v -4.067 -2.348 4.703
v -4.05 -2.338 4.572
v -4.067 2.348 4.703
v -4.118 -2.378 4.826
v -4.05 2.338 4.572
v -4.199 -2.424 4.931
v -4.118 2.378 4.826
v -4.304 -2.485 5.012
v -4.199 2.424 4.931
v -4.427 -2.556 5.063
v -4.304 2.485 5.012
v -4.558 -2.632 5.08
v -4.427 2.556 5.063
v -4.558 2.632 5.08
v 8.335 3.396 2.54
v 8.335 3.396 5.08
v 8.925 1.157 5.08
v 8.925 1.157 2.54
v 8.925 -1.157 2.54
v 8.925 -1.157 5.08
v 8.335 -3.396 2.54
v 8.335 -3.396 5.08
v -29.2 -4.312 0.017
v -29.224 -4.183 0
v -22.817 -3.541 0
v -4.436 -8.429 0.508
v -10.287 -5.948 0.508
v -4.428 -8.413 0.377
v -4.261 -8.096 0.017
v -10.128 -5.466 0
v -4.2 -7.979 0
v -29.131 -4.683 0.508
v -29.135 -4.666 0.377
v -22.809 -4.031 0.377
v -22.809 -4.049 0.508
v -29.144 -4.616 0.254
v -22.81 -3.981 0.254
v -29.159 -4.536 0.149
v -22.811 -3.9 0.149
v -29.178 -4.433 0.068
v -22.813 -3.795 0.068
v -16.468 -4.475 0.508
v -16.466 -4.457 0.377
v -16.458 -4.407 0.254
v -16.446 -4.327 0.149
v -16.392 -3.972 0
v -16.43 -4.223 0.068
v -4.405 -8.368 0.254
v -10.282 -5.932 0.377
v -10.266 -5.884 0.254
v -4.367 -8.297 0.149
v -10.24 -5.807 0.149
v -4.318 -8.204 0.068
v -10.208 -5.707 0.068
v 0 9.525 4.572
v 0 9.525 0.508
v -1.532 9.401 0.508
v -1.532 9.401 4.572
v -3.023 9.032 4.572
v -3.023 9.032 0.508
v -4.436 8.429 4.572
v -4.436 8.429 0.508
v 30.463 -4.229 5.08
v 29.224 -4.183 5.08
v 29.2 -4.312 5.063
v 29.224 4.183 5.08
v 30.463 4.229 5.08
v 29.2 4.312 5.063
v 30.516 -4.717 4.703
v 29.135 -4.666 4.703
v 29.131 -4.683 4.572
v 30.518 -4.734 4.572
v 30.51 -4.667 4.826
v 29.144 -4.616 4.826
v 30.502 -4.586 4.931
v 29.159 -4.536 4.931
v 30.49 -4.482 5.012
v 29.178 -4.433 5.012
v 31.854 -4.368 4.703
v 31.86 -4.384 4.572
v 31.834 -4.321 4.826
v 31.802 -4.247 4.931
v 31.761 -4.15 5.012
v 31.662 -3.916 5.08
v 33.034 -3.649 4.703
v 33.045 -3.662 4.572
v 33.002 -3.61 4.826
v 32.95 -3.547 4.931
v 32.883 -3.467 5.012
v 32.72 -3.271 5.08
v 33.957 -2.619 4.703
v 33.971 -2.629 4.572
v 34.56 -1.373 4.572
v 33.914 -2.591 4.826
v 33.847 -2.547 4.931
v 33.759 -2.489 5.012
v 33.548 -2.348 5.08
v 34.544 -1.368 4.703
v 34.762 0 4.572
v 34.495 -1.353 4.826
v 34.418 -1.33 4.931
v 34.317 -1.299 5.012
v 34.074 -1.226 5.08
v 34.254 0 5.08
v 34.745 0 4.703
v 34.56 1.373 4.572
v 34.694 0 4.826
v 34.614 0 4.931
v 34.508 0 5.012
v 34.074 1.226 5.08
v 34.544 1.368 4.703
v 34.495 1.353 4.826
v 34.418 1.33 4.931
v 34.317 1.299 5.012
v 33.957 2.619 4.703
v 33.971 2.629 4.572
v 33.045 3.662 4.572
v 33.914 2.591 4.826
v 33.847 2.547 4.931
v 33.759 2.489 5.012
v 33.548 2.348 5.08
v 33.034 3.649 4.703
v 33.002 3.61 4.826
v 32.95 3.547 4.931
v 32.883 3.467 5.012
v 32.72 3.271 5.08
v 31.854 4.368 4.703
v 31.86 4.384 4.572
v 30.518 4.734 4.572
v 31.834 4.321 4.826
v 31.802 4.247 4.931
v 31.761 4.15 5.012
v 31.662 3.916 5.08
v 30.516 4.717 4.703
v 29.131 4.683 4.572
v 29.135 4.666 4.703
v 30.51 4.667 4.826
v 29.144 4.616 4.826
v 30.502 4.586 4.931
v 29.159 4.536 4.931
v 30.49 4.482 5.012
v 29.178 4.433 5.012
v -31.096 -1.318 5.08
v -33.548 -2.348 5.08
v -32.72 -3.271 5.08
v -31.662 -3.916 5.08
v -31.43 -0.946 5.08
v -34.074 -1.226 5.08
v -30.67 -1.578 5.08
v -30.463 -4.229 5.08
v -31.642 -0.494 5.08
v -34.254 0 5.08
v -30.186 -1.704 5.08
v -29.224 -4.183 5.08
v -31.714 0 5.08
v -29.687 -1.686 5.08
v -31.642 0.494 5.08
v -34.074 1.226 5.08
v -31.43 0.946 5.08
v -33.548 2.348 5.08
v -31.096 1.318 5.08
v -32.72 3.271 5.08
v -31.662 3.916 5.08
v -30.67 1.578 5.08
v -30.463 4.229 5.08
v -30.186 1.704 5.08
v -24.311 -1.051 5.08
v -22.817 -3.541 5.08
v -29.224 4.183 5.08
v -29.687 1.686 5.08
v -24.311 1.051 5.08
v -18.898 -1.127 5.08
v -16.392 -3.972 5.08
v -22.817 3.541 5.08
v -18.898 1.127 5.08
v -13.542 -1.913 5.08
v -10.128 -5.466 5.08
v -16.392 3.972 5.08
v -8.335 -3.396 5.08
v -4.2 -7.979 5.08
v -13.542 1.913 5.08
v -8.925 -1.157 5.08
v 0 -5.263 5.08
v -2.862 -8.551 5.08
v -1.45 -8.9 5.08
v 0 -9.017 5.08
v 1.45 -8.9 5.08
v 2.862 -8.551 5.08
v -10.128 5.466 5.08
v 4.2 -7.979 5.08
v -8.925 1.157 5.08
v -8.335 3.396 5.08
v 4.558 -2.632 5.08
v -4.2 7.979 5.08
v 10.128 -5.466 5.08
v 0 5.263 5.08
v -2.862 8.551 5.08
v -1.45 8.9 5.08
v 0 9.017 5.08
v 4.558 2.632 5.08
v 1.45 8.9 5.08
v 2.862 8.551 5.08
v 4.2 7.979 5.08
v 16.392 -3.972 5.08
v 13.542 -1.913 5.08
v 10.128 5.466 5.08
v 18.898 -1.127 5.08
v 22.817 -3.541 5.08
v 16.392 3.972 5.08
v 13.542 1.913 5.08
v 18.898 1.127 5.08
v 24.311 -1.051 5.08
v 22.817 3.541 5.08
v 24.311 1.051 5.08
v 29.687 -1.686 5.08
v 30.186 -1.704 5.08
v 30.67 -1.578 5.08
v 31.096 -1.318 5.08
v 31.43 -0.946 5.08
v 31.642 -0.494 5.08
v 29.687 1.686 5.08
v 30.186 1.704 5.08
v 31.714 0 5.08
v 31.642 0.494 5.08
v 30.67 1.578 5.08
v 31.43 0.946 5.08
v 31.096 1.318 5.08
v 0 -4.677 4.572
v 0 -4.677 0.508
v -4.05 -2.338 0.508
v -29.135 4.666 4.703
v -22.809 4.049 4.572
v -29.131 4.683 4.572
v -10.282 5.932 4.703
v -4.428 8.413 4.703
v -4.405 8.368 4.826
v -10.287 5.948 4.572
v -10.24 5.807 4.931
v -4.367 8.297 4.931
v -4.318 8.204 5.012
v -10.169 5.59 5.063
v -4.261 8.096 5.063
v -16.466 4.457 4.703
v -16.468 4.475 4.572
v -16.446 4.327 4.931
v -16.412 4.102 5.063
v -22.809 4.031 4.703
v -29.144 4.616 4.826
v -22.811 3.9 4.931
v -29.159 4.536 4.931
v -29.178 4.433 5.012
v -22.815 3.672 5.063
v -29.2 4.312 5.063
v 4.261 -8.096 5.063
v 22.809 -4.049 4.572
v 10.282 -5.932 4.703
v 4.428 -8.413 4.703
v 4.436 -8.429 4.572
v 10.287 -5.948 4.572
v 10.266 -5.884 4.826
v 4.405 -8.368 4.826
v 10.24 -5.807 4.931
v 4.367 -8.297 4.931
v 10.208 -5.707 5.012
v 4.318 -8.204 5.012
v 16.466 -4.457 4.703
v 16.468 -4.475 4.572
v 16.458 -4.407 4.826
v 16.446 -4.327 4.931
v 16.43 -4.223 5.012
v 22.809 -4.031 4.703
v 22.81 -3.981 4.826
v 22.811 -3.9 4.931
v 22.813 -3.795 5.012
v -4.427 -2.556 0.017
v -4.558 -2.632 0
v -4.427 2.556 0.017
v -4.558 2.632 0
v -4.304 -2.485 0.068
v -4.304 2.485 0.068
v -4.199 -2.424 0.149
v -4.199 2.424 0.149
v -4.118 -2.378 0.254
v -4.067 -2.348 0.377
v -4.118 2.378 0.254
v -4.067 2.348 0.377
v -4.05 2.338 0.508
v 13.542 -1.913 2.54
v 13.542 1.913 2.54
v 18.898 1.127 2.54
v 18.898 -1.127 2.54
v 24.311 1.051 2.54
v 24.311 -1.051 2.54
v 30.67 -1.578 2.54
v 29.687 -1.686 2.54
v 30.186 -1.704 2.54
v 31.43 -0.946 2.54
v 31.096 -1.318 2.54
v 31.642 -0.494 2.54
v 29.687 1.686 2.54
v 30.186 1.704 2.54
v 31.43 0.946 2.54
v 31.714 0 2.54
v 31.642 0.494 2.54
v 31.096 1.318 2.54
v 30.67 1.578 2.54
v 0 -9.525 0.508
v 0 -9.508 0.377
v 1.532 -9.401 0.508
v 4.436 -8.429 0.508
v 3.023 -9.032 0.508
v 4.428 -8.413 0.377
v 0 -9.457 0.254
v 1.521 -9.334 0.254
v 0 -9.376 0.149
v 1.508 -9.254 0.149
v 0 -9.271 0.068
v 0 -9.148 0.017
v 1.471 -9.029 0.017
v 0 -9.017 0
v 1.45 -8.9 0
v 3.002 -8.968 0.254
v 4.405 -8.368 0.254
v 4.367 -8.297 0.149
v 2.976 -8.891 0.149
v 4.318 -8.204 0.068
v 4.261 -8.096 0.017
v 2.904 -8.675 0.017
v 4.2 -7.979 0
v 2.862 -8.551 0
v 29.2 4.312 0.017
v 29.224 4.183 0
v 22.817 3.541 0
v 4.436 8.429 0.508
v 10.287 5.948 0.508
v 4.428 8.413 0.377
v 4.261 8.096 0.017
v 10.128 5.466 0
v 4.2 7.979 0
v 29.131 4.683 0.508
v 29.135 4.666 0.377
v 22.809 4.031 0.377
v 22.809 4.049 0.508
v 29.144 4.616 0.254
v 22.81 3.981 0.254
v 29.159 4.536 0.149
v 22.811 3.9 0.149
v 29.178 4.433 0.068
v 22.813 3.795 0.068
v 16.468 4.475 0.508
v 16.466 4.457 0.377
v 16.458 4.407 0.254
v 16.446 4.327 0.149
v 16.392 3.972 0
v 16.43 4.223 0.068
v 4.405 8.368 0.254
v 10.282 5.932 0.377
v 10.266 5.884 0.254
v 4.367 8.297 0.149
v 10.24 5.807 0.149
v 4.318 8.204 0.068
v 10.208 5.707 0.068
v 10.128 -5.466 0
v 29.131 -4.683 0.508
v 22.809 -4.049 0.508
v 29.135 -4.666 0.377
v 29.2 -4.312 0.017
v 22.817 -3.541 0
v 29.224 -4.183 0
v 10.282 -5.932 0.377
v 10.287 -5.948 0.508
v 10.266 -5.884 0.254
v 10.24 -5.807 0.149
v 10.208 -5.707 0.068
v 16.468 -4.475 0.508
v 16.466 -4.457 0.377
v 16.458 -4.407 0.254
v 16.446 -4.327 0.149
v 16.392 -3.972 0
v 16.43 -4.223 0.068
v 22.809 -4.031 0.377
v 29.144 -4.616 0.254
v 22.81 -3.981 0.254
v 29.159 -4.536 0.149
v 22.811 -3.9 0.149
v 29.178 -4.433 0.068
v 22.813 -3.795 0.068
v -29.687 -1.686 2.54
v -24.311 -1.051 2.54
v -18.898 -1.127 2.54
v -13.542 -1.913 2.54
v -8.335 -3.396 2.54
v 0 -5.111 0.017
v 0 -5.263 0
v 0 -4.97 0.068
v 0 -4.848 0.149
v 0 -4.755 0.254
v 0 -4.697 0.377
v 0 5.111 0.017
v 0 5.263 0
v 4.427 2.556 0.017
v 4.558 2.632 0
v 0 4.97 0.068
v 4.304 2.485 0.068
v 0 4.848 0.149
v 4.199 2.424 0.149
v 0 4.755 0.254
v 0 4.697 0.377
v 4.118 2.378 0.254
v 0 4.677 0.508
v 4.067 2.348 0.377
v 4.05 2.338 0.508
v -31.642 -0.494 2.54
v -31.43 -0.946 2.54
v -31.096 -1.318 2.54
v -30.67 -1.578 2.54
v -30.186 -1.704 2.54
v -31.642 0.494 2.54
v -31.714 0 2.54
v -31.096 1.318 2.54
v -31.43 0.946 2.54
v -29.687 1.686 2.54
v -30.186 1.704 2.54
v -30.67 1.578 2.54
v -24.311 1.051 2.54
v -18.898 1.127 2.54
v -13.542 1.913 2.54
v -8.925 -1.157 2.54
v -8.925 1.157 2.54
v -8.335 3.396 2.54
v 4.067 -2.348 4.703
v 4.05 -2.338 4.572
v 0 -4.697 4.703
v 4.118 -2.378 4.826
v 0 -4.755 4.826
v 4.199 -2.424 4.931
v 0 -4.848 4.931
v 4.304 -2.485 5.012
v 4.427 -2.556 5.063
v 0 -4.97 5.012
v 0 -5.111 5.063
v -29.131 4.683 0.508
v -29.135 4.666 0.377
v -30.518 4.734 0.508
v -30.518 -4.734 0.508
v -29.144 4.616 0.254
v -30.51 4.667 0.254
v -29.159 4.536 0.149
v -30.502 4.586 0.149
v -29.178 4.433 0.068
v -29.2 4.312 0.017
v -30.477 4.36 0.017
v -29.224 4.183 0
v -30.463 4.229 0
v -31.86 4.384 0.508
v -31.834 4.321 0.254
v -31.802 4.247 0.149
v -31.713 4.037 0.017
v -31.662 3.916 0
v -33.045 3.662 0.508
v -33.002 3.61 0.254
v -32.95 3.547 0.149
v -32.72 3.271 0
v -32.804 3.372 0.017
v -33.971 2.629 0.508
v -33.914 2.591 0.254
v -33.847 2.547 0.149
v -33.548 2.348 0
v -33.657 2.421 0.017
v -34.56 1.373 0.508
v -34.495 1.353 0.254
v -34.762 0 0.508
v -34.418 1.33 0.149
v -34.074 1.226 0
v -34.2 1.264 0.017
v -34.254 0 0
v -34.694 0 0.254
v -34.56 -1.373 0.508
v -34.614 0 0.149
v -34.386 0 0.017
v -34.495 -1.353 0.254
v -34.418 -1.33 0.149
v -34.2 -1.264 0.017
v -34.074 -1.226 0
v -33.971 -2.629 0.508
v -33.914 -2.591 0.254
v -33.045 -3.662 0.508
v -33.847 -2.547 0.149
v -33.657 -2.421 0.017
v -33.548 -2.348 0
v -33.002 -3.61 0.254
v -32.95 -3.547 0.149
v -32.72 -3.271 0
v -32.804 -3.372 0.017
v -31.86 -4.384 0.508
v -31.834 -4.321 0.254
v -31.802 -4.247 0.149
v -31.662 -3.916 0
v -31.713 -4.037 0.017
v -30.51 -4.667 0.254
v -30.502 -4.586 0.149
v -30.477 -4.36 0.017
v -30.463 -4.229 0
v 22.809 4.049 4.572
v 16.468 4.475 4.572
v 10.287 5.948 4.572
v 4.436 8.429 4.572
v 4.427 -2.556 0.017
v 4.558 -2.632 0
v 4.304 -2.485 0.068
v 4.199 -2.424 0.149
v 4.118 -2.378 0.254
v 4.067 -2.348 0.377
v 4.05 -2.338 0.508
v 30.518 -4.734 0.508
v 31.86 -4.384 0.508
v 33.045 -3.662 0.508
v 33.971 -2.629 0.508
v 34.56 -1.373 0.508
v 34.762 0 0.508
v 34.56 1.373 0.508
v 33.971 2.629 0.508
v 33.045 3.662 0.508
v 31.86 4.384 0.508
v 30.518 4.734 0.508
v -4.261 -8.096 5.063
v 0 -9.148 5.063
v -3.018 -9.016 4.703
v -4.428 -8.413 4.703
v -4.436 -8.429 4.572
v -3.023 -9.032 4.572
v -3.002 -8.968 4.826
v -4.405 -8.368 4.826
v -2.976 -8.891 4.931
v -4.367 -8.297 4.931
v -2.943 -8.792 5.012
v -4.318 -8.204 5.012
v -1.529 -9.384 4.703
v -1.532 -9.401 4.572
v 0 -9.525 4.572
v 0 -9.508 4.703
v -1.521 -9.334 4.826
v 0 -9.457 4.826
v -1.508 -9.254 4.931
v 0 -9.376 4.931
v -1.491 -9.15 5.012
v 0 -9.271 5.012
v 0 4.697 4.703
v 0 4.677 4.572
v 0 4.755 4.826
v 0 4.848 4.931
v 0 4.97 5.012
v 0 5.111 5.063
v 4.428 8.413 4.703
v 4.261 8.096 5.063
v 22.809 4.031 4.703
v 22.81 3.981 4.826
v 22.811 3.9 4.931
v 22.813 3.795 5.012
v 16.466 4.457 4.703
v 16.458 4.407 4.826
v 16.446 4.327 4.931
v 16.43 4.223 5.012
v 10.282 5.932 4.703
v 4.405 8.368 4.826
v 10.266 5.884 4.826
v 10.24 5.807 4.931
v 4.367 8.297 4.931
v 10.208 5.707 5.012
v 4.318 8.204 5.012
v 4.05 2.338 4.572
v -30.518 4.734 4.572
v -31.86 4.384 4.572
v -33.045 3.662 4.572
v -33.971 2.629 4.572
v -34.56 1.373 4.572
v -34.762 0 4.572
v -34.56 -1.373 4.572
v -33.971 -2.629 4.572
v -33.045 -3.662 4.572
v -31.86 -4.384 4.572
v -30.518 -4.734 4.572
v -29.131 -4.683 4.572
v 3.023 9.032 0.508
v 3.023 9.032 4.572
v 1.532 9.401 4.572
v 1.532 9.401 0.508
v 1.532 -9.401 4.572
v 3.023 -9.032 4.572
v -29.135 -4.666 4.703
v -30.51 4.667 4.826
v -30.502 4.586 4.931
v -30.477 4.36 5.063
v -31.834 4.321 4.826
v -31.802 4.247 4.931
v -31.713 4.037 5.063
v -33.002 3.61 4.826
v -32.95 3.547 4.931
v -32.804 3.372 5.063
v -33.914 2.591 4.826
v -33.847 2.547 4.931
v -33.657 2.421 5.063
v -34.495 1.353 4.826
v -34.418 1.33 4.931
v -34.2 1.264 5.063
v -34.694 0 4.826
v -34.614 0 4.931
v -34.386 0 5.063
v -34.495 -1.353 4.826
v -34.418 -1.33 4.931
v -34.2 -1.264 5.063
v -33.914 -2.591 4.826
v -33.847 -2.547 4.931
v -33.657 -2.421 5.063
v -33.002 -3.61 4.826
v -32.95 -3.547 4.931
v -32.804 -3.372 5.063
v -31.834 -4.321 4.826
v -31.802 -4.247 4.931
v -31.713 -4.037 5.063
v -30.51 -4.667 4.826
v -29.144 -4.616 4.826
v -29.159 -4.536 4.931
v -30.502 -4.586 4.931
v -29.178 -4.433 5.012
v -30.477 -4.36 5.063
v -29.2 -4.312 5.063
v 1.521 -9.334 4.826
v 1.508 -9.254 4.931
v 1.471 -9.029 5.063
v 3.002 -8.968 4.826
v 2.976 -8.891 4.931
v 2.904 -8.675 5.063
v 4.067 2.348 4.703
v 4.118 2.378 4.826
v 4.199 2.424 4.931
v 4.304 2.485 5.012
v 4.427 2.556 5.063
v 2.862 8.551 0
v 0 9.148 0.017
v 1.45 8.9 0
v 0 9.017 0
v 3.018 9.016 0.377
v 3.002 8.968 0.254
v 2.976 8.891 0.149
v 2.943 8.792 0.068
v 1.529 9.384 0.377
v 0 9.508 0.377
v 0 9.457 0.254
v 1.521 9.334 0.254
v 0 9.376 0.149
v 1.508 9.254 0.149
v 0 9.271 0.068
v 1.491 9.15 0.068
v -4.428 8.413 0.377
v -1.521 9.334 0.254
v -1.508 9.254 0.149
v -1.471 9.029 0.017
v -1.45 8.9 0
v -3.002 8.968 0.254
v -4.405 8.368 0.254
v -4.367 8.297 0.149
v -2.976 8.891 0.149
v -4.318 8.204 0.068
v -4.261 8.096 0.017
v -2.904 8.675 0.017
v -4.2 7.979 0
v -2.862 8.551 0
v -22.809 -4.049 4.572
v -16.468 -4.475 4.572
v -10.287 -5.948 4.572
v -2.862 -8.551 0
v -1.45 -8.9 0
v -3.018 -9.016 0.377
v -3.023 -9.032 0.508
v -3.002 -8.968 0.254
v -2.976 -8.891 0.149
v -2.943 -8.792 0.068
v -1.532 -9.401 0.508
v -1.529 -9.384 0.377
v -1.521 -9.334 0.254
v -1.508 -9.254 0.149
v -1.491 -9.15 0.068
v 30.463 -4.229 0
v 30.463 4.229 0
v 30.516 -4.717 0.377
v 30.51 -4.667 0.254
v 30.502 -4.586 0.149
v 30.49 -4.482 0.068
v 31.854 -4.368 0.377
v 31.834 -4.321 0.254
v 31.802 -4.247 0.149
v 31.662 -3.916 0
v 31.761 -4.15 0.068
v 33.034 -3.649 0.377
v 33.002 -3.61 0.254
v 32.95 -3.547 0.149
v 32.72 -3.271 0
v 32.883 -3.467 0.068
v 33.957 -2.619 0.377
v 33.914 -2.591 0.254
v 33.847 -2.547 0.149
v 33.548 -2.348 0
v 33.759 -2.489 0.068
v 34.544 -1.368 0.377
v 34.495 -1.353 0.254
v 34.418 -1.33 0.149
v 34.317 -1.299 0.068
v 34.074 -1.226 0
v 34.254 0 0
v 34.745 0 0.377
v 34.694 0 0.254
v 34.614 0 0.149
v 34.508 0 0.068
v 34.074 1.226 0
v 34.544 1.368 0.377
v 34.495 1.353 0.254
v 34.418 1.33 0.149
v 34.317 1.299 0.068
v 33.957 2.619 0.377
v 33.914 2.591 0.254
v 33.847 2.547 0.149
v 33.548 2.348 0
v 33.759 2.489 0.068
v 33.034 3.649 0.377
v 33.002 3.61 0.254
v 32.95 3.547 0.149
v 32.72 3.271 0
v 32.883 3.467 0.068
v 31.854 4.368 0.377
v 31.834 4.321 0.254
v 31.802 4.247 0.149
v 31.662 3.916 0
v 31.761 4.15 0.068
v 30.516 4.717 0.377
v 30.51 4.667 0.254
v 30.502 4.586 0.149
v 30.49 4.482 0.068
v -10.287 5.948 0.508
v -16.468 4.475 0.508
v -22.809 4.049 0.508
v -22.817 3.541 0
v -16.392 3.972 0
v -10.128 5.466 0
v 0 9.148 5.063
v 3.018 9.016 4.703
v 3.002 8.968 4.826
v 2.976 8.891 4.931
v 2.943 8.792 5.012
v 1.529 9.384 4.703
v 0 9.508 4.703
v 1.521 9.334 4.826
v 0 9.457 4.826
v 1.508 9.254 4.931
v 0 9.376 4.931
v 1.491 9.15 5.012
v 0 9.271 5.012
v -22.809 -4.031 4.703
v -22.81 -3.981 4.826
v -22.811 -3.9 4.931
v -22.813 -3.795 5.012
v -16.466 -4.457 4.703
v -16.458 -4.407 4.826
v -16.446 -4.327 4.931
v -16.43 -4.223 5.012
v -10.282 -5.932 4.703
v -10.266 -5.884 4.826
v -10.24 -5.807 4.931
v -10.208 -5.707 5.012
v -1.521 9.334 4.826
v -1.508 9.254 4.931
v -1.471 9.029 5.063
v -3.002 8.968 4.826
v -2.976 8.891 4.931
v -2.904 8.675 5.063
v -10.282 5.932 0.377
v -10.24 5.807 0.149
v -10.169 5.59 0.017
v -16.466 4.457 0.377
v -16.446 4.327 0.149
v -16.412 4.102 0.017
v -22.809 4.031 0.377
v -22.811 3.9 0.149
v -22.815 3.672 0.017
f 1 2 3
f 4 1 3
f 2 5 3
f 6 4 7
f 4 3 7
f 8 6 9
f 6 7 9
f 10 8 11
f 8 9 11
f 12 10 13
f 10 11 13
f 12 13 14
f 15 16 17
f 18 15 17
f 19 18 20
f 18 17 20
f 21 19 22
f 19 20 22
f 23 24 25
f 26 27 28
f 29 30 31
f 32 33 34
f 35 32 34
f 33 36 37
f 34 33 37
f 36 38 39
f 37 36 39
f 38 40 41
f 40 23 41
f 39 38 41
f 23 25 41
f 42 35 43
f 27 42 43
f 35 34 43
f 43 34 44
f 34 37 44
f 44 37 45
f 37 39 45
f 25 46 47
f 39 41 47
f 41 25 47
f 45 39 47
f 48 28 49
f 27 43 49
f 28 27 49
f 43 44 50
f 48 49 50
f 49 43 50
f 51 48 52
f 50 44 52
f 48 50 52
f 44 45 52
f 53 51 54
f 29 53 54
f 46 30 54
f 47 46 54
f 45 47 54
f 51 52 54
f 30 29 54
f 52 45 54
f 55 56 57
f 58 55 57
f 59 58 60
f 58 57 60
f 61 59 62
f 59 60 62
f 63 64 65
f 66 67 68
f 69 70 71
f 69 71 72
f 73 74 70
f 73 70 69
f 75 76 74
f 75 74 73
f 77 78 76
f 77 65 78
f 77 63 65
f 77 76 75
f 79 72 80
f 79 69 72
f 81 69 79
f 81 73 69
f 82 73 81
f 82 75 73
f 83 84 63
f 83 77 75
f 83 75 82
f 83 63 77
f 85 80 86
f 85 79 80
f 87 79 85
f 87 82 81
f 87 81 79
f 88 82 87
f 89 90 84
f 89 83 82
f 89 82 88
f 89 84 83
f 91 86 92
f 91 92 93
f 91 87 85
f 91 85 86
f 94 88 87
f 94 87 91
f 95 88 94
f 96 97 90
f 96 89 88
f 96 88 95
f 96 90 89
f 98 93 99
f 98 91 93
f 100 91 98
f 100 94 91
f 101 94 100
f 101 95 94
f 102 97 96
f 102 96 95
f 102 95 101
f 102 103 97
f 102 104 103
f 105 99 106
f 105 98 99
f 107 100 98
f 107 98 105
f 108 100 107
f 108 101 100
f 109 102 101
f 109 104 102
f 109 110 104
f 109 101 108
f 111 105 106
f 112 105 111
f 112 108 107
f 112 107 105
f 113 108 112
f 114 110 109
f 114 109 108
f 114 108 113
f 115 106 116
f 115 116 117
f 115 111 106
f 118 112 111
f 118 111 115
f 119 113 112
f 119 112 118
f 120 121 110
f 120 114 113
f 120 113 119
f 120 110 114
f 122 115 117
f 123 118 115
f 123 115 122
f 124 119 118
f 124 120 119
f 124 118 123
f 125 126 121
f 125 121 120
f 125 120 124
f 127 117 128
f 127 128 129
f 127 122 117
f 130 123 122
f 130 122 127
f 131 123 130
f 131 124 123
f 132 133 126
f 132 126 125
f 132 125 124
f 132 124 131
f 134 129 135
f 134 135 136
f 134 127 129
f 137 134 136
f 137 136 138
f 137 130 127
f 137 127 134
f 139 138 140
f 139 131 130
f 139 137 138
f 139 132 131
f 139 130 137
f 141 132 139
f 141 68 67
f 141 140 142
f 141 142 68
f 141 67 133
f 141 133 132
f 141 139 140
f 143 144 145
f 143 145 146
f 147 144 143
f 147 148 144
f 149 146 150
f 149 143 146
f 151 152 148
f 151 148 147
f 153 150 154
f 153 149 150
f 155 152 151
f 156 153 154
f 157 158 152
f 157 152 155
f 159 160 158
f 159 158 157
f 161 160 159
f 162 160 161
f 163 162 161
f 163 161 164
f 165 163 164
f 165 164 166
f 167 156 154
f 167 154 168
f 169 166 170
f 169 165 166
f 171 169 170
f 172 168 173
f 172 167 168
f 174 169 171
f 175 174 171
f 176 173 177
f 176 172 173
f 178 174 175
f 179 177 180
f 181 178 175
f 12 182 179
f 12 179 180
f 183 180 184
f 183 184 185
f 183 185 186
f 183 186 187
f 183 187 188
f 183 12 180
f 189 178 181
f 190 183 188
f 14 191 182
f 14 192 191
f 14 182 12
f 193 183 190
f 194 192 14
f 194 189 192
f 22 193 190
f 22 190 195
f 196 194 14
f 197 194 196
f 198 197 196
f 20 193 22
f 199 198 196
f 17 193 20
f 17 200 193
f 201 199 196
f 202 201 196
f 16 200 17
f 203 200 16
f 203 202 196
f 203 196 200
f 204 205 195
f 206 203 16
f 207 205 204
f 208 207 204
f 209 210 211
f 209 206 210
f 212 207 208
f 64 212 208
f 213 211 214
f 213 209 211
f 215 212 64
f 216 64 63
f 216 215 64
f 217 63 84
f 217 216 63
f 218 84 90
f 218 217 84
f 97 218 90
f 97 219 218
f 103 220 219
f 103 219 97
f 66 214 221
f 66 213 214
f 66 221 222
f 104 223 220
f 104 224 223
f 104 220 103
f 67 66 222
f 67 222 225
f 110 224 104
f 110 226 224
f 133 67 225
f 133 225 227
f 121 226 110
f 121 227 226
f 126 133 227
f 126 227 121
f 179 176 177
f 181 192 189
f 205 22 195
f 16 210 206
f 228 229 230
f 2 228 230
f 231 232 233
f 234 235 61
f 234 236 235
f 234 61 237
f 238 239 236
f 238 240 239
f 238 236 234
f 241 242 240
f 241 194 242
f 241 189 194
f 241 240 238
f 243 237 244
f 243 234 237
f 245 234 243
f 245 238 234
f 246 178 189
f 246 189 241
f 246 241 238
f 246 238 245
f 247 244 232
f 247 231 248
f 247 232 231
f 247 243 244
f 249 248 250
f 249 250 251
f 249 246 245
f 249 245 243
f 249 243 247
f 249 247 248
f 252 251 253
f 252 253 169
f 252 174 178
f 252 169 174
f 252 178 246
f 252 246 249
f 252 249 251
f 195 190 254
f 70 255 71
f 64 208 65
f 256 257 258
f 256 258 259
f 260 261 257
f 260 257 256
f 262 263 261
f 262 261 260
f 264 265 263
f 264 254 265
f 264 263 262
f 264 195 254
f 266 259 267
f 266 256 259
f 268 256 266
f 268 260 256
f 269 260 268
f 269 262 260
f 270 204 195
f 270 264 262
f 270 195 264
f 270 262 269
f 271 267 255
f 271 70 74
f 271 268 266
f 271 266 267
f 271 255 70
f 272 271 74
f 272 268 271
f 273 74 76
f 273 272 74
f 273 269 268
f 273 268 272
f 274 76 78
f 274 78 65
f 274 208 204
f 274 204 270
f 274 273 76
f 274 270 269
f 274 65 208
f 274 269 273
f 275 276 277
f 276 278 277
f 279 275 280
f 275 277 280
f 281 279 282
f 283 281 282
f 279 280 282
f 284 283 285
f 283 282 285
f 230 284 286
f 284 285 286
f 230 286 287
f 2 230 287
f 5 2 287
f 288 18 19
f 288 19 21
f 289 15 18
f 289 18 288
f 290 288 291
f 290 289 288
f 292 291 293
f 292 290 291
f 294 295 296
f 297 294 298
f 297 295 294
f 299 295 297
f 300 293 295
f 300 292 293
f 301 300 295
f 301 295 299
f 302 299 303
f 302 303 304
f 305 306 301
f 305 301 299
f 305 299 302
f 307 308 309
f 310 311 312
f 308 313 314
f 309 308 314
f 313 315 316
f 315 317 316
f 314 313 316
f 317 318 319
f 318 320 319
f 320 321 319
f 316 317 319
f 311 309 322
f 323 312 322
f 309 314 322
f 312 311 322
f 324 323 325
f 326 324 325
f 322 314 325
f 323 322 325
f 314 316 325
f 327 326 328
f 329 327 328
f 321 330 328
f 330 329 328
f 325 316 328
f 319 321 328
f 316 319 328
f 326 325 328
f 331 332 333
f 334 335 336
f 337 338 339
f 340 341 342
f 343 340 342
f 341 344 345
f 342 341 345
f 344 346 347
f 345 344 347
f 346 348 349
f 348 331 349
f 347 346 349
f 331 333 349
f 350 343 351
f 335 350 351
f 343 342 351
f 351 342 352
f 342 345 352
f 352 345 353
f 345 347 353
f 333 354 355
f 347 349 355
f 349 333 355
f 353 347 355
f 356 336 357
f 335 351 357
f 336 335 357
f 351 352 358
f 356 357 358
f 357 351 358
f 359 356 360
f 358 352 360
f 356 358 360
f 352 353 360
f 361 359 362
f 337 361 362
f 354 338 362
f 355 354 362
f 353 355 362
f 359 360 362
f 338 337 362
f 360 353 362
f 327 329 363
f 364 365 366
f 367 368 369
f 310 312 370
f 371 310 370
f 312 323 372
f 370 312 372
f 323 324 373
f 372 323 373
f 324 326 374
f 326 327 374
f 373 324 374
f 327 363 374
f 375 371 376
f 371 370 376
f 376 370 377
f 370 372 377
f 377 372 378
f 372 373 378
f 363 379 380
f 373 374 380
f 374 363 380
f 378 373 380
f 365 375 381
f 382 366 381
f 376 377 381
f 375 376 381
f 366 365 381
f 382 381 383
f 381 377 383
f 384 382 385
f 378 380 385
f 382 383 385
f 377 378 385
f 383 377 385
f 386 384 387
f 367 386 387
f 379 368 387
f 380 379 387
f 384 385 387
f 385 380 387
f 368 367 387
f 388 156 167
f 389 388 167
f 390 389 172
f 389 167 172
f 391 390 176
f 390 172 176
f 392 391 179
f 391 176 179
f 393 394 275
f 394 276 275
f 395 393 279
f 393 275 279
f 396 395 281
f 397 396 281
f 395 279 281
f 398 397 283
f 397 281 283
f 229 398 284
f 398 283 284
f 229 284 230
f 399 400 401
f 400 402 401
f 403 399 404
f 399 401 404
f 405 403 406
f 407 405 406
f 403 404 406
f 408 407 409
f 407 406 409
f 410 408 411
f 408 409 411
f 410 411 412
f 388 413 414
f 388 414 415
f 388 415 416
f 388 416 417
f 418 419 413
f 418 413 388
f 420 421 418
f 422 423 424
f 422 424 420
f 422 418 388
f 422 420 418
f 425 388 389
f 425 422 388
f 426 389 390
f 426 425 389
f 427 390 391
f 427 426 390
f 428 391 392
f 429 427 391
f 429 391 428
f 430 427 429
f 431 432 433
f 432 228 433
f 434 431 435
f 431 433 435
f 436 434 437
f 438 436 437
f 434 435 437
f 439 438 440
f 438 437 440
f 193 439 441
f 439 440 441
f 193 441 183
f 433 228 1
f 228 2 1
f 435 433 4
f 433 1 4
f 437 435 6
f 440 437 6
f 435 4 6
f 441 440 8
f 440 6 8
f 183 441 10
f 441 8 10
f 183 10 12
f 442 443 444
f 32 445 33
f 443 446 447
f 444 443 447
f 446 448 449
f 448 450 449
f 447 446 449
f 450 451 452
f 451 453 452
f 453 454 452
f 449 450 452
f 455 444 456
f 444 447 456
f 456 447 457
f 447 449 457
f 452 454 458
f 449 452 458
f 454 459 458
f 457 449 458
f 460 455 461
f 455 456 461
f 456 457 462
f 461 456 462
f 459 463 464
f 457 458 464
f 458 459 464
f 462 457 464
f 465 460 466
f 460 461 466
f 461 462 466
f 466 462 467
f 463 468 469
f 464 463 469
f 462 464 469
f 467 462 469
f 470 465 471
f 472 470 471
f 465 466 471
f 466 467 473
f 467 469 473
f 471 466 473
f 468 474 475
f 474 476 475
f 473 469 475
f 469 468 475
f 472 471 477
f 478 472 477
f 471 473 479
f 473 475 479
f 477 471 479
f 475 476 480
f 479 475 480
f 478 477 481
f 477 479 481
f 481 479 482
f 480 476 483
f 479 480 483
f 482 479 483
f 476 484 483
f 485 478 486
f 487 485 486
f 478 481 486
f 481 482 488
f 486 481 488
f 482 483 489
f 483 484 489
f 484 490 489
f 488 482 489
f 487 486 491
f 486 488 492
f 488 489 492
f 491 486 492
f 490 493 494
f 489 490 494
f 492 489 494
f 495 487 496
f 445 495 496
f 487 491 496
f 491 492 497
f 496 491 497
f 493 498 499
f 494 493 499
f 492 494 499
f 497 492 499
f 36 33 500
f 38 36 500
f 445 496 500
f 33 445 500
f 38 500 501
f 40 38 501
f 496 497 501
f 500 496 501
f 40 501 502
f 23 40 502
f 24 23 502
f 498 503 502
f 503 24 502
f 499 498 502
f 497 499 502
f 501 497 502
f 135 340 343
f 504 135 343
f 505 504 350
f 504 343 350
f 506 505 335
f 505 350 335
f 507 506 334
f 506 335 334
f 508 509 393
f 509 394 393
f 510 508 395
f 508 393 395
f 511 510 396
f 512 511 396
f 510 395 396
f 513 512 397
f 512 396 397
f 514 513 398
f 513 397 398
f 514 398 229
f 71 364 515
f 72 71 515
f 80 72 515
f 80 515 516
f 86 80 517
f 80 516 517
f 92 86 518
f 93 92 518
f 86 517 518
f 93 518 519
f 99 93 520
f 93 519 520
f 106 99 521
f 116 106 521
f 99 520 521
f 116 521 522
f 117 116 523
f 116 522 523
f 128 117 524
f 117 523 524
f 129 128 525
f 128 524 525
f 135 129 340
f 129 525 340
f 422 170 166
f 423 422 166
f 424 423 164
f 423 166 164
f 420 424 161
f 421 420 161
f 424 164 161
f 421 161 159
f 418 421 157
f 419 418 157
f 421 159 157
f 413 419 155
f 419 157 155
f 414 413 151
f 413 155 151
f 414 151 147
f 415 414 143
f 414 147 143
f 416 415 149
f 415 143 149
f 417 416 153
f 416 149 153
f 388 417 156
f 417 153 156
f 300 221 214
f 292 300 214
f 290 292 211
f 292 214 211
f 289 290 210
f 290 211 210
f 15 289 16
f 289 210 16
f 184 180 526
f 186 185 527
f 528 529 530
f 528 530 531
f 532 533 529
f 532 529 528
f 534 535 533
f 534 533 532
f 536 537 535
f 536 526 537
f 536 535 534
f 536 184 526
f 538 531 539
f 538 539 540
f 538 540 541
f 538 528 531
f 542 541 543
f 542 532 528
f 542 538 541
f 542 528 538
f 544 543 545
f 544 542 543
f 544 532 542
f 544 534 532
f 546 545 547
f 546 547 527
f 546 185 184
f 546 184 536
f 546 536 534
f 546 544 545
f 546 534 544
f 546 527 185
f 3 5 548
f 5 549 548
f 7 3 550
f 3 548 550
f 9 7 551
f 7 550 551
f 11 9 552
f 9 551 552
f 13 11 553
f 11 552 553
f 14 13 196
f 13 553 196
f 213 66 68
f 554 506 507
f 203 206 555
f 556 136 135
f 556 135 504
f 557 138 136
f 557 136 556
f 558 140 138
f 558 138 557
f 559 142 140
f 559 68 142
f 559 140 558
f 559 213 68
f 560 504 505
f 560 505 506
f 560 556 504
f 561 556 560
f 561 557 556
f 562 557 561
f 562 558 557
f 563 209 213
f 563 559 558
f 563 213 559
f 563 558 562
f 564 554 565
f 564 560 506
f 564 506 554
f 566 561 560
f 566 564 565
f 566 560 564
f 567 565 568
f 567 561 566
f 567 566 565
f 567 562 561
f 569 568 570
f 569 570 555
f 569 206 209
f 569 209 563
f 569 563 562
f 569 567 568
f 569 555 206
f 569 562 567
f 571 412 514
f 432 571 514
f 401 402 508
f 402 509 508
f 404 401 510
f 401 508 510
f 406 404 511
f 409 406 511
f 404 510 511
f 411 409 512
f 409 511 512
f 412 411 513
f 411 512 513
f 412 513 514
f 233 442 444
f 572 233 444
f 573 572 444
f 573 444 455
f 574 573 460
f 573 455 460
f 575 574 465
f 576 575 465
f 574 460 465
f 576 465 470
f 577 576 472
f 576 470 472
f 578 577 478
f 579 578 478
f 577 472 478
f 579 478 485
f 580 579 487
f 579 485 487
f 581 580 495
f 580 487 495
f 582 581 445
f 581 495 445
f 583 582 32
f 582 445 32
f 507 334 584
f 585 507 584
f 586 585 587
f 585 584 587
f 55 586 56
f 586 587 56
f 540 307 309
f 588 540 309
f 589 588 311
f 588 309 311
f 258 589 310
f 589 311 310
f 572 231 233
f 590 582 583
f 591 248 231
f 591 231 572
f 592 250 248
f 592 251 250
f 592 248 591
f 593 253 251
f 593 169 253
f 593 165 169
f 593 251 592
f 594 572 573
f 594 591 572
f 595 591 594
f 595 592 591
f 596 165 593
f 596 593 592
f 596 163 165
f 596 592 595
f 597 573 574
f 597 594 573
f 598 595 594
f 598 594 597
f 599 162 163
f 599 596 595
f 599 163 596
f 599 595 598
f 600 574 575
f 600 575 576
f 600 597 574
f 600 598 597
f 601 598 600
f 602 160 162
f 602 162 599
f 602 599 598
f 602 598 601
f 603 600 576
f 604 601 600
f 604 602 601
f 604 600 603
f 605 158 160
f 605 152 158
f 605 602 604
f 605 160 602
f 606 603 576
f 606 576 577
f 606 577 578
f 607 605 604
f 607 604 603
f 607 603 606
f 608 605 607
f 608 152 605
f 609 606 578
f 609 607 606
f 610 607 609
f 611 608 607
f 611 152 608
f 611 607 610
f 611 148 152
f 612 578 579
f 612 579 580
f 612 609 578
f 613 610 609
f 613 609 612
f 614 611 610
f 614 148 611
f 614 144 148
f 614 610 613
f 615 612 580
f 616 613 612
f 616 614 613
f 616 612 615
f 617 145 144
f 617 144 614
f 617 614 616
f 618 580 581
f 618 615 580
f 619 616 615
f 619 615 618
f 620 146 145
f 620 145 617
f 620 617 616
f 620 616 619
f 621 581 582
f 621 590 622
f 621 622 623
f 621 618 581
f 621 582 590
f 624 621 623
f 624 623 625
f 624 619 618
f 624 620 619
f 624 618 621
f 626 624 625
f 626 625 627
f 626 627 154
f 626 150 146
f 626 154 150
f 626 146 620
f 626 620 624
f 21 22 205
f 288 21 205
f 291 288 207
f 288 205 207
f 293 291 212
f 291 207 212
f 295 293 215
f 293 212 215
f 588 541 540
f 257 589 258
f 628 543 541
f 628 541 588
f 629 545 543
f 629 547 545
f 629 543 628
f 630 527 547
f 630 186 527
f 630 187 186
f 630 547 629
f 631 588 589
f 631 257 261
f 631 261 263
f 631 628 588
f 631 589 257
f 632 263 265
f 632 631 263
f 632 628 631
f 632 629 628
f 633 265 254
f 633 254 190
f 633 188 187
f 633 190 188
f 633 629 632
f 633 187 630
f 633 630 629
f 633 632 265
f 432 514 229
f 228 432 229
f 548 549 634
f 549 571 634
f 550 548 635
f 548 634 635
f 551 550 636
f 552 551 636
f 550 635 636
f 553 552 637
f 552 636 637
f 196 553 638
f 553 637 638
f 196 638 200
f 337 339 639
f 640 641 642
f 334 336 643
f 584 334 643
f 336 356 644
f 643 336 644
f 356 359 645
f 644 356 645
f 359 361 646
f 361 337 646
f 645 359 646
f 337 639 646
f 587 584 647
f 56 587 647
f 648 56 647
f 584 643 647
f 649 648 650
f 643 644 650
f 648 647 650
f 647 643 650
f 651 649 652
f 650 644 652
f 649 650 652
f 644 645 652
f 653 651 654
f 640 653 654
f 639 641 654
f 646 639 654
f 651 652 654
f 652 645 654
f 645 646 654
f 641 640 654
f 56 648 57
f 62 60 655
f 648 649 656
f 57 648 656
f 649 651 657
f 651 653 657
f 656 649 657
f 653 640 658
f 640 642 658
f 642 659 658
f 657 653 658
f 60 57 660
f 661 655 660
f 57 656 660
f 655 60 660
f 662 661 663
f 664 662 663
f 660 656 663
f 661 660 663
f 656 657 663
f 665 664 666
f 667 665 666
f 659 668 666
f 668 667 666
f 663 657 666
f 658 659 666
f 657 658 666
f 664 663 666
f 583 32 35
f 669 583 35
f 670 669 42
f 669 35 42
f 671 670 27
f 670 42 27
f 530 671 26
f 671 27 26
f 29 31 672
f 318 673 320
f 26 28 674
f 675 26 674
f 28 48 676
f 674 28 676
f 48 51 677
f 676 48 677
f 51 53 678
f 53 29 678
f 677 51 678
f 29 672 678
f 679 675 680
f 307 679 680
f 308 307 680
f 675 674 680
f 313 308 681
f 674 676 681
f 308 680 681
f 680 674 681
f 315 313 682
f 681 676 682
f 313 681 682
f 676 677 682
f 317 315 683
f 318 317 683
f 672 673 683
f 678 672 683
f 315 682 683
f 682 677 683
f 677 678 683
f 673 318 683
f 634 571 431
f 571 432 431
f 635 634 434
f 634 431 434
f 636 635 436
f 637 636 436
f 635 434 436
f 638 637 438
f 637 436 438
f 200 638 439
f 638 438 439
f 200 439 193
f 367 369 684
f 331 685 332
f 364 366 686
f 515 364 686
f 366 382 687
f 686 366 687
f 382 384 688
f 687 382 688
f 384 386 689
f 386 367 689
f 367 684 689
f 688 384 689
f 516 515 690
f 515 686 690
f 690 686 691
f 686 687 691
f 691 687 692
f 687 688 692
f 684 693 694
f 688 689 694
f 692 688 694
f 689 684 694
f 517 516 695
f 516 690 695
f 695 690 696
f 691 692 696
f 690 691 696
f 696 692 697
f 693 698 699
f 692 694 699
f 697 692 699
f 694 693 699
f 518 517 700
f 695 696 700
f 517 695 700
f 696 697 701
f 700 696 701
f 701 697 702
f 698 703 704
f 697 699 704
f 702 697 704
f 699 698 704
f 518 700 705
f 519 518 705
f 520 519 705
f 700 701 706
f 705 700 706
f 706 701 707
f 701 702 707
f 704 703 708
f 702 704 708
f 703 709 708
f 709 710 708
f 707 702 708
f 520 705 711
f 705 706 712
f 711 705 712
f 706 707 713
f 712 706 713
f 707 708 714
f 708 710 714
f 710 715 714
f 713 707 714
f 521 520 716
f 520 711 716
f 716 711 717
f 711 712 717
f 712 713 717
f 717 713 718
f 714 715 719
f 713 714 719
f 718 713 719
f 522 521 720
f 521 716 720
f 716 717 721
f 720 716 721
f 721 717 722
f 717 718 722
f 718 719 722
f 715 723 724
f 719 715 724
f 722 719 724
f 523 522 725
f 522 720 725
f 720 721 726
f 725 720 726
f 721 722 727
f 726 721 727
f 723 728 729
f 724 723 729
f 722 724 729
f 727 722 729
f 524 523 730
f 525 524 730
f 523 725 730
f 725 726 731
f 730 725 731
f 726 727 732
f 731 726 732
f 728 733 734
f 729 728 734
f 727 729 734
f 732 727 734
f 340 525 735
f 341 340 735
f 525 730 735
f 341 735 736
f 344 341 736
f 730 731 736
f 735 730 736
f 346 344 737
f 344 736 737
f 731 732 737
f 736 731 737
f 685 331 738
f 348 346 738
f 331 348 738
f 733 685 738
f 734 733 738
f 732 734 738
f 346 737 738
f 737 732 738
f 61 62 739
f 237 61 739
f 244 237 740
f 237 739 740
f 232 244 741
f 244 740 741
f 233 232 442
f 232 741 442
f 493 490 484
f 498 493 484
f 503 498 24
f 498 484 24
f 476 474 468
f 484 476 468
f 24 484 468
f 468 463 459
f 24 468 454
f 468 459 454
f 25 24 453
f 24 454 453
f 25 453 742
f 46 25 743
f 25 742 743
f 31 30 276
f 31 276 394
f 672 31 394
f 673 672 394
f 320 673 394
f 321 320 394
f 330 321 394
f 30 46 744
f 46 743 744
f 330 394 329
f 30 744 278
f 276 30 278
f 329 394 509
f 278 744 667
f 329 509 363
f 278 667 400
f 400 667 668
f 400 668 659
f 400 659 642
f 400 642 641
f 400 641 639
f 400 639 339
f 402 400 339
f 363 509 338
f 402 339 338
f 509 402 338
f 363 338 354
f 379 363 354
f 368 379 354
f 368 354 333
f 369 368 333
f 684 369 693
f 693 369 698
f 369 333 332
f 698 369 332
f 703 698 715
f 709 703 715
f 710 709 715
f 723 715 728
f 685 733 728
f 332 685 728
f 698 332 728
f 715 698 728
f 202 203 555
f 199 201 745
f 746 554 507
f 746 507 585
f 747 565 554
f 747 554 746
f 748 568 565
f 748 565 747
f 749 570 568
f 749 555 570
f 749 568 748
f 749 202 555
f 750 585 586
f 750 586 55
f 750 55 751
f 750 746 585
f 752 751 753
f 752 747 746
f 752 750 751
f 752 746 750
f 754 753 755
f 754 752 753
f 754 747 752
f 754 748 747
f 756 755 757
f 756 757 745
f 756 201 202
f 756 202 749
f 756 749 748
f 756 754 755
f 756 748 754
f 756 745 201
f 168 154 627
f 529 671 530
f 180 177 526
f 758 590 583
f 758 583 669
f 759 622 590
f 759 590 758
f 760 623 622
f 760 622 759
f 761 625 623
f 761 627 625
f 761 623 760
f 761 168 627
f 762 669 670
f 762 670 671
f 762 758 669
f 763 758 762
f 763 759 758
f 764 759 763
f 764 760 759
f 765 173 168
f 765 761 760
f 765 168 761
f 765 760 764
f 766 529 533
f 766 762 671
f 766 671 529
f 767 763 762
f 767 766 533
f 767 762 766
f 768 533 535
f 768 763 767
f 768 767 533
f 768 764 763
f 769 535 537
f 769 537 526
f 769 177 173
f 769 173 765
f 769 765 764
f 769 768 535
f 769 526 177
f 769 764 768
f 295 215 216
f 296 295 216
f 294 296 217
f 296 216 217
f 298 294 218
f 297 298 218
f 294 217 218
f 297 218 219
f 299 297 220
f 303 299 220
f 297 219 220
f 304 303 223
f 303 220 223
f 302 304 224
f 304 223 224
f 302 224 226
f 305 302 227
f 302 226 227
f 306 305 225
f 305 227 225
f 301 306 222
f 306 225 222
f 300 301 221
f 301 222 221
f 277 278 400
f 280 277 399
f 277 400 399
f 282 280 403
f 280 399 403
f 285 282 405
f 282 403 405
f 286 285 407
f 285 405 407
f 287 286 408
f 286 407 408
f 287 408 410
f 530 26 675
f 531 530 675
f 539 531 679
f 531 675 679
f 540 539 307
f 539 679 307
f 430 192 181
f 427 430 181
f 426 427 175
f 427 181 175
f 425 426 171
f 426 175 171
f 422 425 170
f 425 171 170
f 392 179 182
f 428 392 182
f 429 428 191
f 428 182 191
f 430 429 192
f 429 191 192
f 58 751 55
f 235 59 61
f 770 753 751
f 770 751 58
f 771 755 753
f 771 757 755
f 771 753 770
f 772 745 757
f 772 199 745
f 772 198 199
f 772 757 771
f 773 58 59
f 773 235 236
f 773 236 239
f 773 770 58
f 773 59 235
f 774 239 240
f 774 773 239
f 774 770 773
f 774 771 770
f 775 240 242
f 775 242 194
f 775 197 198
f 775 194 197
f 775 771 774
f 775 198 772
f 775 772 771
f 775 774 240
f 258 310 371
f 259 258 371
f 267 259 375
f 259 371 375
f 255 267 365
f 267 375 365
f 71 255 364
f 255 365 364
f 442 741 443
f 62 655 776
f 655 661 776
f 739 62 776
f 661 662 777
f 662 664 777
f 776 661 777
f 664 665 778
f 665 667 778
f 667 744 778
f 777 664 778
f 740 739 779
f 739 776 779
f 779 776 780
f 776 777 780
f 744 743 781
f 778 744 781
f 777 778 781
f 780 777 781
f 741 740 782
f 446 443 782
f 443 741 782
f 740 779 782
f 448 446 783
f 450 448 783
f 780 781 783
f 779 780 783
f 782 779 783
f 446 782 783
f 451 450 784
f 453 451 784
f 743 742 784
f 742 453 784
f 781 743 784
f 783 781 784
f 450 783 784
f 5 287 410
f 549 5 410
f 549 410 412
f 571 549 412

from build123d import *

# Parameters (mm, degrees)
F1_DEPTH = 5.08
F2_R     = 0.508
F3_R     = 0.508
F5_DEPTH = 2.54


with BuildPart() as f1:
    # F0 (on Top) → F1 (new body)
    with BuildSketch(Plane.XY):
        with BuildLine():
            ThreePointArc((-29.131383, -4.682618), (-16.468234, -4.474505), (-4.436489, -8.428712))
            ThreePointArc((-4.436489, -8.428712), (-2.284966, -9.246867), (0, -9.525))
            ThreePointArc((0, -9.525), (2.284966, -9.246867), (4.436489, -8.428712))
            ThreePointArc((4.436489, -8.428712), (16.468234, -4.474505), (29.131383, -4.682618))
            ThreePointArc((29.131383, -4.682618), (34.7625, 0), (29.131383, 4.682618))
            ThreePointArc((29.131383, 4.682618), (16.468234, 4.474505), (4.436489, 8.428712))
            ThreePointArc((4.436489, 8.428712), (2.284966, 9.246867), (0, 9.525))
            ThreePointArc((0, 9.525), (-2.284966, 9.246867), (-4.436489, 8.428712))
            ThreePointArc((-4.436489, 8.428712), (-16.468234, 4.474505), (-29.131383, 4.682618))
            ThreePointArc((-29.131383, 4.682618), (-34.7625, 0), (-29.131383, -4.682618))
        make_face()
        Polygon((-4.05, 2.338269), (0, 4.676537), (4.05, 2.338269), (4.05, -2.338269), (0, -4.676537), (-4.05, -2.338269), align=None, mode=Mode.SUBTRACT)
    extrude(amount=F1_DEPTH)

    # F2
    f2_edges = [f1.edges().sort_by_distance(p)[0] for p in [
        (-34.7625, 0, 5.08),
        (-16.468234, -4.474505, 5.08),
        (0, -9.525, 5.08),
        (16.468234, -4.474505, 5.08),
        (34.7625, 0, 5.08),
        (16.468234, 4.474505, 5.08),
        (0, 9.525, 5.08),
        (-16.468234, 4.474505, 5.08),
        (-2.025, 3.507403, 5.08),
        (2.025, 3.507403, 5.08),
        (4.05, 0, 5.08),
        (2.025, -3.507403, 5.08),
        (-2.025, -3.507403, 5.08),
        (-4.05, 0, 5.08),
    ]]
    fillet(f2_edges, radius=F2_R)

    # F3
    f3_edges = [f1.edges().sort_by_distance(p)[0] for p in [
        (-34.7625, 0, 0),
        (-16.468234, -4.474505, 0),
        (0, -9.525, 0),
        (16.468234, -4.474505, 0),
        (34.7625, 0, 0),
        (16.468234, 4.474505, 0),
        (0, 9.525, 0),
        (-16.468234, 4.474505, 0),
        (-2.025, 3.507403, 0),
        (2.025, 3.507403, 0),
        (4.05, 0, 0),
        (2.025, -3.507403, 0),
        (-2.025, -3.507403, 0),
        (-4.05, 0, 0),
    ]]
    fillet(f3_edges, radius=F3_R)

    # F4 (on face) → F5 (cut)
    with BuildSketch(Plane.XY.offset(5.08)):
        with BuildLine():
            ThreePointArc((29.687298, -1.685742), (31.7145, 0), (29.687298, 1.685742))
            ThreePointArc((29.687298, 1.685742), (18.897854, 1.126865), (8.334847, 3.395633))
            ThreePointArc((8.334847, 3.395633), (9, 0), (8.334847, -3.395633))
            ThreePointArc((8.334847, -3.395633), (18.897854, -1.126865), (29.687298, -1.685742))
        make_face()
        with BuildLine():
            ThreePointArc((-8.334847, -3.395633), (-9, 0), (-8.334847, 3.395633))
            ThreePointArc((-8.334847, 3.395633), (-18.897854, 1.126865), (-29.687298, 1.685742))
            ThreePointArc((-29.687298, 1.685742), (-31.7145, 0), (-29.687298, -1.685742))
            ThreePointArc((-29.687298, -1.685742), (-18.897854, -1.126865), (-8.334847, -3.395633))
        make_face()
    extrude(amount=-F5_DEPTH, mode=Mode.SUBTRACT)


solid = f1.part
